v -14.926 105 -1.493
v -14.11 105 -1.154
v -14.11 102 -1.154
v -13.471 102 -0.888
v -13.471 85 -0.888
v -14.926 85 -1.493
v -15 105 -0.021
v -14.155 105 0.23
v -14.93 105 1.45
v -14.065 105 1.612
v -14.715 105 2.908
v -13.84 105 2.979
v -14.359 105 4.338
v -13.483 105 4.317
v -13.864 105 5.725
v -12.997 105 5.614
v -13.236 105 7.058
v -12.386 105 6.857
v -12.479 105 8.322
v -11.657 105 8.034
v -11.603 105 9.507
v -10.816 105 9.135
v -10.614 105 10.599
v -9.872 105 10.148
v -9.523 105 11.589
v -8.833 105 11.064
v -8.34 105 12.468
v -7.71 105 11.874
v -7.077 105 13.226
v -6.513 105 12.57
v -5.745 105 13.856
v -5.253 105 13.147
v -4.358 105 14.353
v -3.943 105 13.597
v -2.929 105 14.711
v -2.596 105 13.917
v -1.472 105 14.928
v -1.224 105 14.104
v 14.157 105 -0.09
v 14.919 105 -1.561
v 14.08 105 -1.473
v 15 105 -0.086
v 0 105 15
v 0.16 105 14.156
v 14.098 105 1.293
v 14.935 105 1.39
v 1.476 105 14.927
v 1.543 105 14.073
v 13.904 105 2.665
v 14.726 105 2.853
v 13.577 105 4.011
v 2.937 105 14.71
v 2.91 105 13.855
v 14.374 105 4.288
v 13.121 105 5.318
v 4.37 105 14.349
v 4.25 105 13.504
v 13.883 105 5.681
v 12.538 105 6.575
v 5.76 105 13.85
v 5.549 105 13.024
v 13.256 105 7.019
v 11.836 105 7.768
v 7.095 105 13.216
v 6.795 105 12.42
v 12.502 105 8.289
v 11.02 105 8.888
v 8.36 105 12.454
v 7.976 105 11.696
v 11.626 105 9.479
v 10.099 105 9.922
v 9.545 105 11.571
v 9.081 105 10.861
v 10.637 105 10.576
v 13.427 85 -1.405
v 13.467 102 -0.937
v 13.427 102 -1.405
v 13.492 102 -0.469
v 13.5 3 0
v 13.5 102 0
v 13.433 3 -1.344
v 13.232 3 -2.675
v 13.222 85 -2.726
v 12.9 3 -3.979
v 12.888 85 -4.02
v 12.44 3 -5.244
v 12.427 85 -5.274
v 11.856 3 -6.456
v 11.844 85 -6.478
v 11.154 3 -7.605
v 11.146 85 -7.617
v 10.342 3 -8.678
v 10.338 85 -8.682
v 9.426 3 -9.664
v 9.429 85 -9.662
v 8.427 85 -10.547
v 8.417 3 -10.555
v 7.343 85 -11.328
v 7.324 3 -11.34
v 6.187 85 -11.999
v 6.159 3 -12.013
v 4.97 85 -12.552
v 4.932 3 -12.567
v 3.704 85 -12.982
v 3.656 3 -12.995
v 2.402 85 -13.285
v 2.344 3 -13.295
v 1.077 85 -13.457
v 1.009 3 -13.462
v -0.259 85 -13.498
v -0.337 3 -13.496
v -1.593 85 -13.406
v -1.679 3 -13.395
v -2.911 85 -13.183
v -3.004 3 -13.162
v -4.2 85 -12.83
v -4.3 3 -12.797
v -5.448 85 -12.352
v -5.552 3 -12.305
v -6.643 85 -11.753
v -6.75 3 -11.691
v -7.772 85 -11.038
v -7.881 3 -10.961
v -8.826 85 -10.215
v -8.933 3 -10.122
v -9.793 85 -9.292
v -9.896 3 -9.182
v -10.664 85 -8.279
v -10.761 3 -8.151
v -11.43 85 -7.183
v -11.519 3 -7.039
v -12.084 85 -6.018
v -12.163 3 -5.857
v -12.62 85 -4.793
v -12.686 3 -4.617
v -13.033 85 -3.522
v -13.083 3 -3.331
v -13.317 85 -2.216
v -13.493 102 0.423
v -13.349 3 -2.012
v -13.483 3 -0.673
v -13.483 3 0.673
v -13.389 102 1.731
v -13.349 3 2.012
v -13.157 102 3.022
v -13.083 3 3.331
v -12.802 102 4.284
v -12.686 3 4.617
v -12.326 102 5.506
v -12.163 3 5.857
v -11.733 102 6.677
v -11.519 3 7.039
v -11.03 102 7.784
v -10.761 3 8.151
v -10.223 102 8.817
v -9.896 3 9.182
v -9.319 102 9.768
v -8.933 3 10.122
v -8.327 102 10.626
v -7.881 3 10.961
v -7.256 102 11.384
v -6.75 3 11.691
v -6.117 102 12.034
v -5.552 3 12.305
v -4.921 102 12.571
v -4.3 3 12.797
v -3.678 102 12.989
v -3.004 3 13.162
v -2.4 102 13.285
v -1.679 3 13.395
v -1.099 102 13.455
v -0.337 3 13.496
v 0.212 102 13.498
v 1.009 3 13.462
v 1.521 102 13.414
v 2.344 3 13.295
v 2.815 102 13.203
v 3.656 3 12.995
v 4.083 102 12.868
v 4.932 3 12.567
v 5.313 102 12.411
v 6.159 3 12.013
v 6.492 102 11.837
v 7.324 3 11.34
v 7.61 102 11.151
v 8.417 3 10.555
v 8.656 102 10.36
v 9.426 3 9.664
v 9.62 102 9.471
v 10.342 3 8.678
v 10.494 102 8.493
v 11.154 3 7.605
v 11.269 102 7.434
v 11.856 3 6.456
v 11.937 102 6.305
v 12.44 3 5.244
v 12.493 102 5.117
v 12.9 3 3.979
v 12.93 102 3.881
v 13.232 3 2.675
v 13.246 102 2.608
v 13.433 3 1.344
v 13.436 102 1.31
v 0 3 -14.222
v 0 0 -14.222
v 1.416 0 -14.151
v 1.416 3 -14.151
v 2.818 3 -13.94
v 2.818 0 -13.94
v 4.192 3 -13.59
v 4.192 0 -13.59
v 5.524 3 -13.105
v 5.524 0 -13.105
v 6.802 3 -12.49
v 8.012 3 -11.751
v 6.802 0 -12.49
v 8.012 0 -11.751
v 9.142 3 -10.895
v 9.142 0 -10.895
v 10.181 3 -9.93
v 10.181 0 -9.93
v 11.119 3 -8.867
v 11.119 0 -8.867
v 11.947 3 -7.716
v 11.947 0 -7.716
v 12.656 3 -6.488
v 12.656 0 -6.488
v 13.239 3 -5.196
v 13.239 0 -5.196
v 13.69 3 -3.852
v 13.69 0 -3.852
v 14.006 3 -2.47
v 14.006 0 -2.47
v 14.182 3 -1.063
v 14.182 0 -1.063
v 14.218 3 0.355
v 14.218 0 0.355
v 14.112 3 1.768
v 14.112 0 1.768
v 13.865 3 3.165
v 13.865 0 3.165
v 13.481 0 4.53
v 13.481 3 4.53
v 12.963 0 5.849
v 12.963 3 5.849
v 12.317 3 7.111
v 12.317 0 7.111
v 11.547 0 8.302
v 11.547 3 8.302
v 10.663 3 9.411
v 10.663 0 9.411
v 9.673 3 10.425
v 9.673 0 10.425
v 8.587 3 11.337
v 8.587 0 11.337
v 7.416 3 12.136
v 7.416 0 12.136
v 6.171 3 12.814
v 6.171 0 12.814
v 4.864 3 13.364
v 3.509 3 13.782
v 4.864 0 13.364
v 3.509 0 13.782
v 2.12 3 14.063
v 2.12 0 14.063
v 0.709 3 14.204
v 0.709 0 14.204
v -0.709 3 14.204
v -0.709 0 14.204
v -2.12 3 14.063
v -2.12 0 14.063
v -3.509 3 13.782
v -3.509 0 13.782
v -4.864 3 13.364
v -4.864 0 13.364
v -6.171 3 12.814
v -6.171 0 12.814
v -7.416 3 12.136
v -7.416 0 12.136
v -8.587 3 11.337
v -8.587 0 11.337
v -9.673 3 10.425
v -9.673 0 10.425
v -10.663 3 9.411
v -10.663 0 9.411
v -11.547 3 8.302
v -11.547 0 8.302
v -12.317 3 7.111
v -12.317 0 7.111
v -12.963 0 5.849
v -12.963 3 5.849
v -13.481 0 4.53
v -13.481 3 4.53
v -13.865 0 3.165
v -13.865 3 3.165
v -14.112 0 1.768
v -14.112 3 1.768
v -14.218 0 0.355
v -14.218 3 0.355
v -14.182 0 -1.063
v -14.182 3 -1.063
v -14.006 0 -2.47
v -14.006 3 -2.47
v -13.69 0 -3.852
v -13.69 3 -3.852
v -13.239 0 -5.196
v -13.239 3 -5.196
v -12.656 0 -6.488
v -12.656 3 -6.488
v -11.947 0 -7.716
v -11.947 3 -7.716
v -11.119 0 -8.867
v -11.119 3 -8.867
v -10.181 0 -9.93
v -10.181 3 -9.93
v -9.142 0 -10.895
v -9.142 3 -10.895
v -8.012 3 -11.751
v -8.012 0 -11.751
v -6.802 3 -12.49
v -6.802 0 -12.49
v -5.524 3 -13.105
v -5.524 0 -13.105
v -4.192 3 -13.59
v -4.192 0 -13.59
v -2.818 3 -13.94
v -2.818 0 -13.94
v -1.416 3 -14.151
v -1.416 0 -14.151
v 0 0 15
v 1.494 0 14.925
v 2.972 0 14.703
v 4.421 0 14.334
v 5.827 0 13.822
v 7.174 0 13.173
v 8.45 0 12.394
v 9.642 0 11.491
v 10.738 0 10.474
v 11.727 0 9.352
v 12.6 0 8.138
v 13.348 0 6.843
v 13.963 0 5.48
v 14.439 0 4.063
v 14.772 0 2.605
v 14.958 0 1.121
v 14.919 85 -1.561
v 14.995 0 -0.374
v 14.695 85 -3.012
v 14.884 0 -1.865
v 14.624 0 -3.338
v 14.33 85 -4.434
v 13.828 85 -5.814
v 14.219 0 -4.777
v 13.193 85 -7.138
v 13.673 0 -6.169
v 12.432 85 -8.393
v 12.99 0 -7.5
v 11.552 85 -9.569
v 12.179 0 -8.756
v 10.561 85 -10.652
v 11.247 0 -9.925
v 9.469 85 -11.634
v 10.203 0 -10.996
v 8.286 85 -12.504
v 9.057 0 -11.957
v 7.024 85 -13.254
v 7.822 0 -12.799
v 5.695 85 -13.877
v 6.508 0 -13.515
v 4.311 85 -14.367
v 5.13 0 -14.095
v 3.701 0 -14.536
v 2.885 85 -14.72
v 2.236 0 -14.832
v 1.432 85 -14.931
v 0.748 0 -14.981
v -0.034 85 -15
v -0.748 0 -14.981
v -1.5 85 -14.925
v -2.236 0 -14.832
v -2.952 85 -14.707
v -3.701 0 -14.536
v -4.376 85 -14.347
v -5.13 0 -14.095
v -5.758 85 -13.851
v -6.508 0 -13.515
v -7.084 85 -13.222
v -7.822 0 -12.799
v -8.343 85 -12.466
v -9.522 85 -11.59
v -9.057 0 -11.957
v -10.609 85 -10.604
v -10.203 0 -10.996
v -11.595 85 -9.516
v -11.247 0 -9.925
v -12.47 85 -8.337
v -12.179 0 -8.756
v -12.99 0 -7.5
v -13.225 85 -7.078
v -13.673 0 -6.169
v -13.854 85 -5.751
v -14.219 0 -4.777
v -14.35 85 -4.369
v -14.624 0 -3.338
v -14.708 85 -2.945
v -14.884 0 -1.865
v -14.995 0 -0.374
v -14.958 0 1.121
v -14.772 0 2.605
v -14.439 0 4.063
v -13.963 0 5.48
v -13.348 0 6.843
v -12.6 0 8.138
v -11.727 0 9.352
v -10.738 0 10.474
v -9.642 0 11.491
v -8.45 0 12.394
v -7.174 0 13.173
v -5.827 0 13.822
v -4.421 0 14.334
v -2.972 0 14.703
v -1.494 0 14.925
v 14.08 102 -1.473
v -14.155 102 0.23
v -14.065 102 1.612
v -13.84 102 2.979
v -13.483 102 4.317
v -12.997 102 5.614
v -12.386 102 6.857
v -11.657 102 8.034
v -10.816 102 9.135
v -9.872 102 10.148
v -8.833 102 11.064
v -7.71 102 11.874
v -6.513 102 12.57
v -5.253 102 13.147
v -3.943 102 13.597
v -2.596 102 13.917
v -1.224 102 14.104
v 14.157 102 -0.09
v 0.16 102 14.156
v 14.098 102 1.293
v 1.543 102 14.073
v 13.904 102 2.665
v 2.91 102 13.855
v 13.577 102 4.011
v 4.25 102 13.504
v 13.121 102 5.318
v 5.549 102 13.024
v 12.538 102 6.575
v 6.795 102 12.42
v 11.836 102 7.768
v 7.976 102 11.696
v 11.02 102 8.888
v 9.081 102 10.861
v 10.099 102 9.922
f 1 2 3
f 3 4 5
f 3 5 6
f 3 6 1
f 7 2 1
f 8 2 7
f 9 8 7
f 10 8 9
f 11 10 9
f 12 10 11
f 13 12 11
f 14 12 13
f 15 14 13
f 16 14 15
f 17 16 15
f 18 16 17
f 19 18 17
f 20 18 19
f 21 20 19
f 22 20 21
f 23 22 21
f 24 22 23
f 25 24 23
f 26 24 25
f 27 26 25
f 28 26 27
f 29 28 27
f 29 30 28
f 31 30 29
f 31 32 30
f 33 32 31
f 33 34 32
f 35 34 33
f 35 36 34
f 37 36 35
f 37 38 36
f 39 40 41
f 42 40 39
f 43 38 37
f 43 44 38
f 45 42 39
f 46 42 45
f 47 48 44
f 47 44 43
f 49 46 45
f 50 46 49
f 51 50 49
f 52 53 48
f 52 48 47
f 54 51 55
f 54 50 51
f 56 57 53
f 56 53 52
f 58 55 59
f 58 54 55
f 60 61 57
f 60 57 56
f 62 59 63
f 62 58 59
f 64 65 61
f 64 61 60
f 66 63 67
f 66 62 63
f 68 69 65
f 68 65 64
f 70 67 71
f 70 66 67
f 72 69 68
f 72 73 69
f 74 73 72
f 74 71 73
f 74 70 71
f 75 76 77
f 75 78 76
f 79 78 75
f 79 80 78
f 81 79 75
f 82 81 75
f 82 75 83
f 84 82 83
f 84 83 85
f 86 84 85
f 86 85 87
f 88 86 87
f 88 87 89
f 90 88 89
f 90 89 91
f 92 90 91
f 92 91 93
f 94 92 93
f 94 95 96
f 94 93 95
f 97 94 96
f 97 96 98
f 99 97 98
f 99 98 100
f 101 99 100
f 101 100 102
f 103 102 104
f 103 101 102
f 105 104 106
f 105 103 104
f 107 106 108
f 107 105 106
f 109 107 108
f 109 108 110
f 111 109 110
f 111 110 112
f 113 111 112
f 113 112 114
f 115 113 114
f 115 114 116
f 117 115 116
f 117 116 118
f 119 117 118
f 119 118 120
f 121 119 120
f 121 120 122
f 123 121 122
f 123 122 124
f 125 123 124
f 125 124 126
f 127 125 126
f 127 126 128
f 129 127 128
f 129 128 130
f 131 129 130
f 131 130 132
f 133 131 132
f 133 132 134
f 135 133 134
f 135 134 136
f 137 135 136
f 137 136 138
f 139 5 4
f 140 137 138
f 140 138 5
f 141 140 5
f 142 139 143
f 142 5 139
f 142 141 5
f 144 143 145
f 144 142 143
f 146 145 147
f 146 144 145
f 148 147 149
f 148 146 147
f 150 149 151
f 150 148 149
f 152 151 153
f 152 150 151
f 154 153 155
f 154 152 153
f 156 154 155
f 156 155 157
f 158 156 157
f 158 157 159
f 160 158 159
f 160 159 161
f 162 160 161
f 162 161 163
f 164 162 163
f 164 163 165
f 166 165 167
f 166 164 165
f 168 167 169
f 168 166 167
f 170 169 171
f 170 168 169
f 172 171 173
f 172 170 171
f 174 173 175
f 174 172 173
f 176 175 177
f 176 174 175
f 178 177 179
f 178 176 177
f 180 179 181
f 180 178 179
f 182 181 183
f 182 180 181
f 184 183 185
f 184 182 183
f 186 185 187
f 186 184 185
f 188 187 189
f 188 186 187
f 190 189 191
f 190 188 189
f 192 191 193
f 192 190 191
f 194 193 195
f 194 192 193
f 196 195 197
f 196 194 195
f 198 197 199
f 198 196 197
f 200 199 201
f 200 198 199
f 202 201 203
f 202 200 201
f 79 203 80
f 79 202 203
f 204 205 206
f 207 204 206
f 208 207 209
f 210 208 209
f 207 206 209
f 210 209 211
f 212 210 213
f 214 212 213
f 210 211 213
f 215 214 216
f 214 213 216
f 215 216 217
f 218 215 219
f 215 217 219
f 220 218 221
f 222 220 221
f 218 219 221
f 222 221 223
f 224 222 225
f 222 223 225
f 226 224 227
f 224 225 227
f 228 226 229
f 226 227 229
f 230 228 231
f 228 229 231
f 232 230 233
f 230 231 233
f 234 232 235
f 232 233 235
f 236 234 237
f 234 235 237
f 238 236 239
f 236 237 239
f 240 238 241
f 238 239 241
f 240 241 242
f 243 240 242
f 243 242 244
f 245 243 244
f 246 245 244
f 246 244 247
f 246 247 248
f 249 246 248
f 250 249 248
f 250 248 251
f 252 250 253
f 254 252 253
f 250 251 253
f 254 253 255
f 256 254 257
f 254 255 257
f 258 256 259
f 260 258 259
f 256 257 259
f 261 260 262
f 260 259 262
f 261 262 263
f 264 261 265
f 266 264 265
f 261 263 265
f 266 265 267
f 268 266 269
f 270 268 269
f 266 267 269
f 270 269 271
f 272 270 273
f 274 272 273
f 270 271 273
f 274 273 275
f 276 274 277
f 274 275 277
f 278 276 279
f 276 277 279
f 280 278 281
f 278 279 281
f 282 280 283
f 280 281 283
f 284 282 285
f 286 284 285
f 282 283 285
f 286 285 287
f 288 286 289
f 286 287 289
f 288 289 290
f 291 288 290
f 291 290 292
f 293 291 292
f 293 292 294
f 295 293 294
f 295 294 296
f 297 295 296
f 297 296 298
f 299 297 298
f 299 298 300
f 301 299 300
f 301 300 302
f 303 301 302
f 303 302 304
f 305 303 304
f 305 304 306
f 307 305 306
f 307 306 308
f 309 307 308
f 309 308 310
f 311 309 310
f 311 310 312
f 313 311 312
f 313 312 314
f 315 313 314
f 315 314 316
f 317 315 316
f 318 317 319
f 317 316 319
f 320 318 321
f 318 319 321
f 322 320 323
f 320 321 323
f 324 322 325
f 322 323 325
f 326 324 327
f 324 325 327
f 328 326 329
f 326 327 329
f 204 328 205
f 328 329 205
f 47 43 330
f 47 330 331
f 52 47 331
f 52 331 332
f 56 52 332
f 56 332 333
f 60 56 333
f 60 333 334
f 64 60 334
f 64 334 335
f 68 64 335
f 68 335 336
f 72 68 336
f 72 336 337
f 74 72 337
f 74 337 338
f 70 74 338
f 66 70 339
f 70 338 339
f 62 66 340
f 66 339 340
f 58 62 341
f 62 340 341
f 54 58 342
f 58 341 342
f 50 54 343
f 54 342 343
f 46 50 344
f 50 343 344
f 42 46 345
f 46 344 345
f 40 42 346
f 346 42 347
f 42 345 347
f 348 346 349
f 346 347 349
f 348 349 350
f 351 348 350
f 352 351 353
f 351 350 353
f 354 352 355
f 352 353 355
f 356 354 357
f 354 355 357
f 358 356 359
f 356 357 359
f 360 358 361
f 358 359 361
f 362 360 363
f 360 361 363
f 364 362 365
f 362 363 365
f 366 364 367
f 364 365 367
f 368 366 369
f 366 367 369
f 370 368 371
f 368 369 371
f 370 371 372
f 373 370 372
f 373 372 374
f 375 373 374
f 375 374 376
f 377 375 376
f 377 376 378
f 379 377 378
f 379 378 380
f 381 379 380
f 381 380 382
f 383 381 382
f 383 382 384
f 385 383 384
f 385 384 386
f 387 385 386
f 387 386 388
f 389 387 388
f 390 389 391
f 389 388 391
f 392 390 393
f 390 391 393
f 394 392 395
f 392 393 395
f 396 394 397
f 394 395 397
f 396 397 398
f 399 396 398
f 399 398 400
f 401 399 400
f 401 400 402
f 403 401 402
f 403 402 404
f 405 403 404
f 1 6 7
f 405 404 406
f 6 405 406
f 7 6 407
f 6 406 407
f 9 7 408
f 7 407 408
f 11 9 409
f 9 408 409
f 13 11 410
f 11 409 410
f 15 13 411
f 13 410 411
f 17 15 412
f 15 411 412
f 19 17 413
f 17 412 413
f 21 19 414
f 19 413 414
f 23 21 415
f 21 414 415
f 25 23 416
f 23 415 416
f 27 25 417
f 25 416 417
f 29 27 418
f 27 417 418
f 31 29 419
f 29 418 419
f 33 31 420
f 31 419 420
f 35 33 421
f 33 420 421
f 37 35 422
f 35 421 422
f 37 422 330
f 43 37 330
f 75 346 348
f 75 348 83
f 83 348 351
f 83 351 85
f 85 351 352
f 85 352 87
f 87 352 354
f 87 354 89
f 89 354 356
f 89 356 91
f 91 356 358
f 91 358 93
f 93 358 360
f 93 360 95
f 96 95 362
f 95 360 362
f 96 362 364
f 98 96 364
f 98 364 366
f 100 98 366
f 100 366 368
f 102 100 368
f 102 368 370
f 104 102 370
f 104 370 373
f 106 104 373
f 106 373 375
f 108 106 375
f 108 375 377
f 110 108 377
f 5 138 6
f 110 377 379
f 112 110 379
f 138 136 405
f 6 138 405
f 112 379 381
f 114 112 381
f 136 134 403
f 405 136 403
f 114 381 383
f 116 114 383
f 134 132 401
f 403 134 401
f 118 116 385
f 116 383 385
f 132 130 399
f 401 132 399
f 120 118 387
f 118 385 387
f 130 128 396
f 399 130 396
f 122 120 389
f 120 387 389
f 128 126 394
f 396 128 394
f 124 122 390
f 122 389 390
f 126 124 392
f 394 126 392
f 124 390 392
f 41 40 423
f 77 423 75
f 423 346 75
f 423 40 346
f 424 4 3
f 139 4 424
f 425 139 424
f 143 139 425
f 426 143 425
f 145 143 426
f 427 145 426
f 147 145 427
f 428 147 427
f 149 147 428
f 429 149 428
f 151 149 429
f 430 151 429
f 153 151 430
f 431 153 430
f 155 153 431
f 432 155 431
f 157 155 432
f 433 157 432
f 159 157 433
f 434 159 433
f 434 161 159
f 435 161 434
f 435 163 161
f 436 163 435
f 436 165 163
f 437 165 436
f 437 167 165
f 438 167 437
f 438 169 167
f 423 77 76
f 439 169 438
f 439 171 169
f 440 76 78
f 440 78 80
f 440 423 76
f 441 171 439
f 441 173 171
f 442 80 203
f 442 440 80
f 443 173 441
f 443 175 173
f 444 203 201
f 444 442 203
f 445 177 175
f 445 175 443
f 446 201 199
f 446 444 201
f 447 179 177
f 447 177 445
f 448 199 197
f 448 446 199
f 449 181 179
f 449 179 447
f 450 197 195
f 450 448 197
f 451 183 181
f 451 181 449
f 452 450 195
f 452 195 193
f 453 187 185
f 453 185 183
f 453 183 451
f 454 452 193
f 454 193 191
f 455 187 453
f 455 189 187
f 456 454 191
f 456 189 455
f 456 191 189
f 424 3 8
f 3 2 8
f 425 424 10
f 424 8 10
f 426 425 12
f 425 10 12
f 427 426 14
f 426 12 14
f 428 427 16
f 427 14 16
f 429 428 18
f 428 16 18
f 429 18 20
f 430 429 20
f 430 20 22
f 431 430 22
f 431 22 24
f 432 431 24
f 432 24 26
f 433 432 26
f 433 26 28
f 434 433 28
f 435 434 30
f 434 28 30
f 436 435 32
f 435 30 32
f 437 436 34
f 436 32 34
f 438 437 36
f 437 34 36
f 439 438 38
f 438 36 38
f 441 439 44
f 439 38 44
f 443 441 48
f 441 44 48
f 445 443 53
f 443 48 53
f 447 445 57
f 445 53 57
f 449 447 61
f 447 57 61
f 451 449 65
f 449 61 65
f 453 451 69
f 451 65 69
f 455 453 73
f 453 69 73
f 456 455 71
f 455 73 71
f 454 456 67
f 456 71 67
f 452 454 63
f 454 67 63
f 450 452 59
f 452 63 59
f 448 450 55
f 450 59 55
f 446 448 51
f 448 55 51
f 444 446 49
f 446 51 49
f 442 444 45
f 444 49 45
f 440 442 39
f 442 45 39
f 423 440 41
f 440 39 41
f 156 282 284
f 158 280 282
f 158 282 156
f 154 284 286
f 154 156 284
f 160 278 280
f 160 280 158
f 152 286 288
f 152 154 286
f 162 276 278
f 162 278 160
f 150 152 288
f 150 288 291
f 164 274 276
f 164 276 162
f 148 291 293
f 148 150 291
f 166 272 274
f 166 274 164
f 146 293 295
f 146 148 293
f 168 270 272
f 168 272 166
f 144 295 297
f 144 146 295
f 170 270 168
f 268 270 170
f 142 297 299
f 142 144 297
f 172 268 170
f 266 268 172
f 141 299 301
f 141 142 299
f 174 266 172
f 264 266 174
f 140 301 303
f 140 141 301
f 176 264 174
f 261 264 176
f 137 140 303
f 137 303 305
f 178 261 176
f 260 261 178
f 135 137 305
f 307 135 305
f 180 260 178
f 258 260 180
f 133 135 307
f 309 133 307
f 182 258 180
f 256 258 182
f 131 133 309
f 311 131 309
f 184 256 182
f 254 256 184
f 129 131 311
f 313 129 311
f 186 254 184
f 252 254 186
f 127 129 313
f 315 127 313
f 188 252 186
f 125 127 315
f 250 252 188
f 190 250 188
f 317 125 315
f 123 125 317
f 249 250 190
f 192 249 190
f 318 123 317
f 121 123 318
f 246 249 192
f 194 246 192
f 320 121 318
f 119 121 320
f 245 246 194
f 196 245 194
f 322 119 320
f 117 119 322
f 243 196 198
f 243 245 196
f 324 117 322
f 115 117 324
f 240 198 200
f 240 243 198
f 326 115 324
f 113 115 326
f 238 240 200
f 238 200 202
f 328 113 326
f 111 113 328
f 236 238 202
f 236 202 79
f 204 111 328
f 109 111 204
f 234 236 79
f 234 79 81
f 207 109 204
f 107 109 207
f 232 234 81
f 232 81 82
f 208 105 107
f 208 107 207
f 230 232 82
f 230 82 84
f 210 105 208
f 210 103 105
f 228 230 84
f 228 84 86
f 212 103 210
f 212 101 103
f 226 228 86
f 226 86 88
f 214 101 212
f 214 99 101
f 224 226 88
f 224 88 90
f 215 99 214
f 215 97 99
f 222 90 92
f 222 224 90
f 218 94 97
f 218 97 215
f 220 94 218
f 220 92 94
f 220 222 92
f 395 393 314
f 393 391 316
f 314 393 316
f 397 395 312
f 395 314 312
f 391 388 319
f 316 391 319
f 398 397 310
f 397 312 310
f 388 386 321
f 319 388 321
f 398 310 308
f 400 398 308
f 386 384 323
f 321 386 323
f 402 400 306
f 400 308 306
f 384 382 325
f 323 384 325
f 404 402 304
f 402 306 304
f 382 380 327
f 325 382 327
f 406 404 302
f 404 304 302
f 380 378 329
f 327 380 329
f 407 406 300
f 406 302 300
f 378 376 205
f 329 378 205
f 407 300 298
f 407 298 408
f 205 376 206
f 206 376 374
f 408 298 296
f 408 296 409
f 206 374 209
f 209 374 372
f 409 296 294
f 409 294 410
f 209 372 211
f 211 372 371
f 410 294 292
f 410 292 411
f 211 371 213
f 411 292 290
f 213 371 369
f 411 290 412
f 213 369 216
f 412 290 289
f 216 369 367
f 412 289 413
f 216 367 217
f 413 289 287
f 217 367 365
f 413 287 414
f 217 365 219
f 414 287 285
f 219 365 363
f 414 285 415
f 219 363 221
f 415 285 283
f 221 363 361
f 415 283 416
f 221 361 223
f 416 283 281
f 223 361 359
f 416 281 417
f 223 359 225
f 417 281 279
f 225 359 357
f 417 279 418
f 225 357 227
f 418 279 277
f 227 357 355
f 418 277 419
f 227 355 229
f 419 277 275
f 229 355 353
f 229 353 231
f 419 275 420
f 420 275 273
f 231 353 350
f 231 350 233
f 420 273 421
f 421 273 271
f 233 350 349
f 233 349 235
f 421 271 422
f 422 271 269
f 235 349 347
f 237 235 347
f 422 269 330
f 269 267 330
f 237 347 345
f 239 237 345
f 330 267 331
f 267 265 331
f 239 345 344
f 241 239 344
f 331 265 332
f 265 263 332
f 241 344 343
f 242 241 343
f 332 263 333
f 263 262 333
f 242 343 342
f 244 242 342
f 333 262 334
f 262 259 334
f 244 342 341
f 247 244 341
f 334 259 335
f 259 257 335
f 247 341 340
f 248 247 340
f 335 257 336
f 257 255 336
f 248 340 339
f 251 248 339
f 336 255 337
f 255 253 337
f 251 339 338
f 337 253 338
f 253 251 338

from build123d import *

# Parameters (mm, degrees)
SKETCH1_R           = 15
BOSS_EXTRUDE1_DEPTH = 105
SKETCH6_R           = 14.222015383
CUT_EXTRUDE4_DEPTH  = 3
SHELL1_START        = 3
SHELL1_OUTLINE_R    = 13.5
SHELL1_DEPTH        = 102
SKETCH8_R           = 14.157324042
CUT_EXTRUDE6_DEPTH  = 3
CUT_EXTRUDE7_START  = -20
CUT_EXTRUDE7_DEPTH  = 20


# Read off the part's stored shape, not the designer's step: Shell1
with BuildPart() as part:
    # Sketch1 → Boss-Extrude1 (new body)
    with BuildSketch(Plane(origin=(0, 0, 0), x_dir=(1, 0, 0), z_dir=(0, 1, 0))):
        with Locations(Location((0, 0, 0), (0, 0, 270))):
            Circle(SKETCH1_R)
    extrude(amount=BOSS_EXTRUDE1_DEPTH)

    # Sketch6 → Cut-Extrude4 (cut)
    with BuildSketch(Plane.XZ):
        with Locations(Location((0, 0, 0), (0, 0, 270))):
            Circle(SKETCH6_R)
    extrude(amount=-CUT_EXTRUDE4_DEPTH, mode=Mode.SUBTRACT)

    # Shell1 outline → Shell1 (cut)
    with BuildSketch(Plane(origin=(0, 0, 0), x_dir=(1, 0, 0), z_dir=(0, 1, 0)).offset(SHELL1_START)):
        Circle(SHELL1_OUTLINE_R)
    extrude(amount=SHELL1_DEPTH, mode=Mode.SUBTRACT)

    # Sketch8 → Cut-Extrude6 (cut)
    with BuildSketch(Plane(origin=(0, 105, 0), x_dir=(1, 0, 0), z_dir=(0, 1, 0))):
        with Locations(Location((0, 0, 0), (0, 0, 270))):
            Circle(SKETCH8_R)
    extrude(amount=-CUT_EXTRUDE6_DEPTH, mode=Mode.SUBTRACT)

    # Sketch9 → Cut-Extrude7 (cut)
    with BuildSketch(Plane(origin=(0, 105, 0), x_dir=(1, 0, 0), z_dir=(0, 1, 0)).offset(CUT_EXTRUDE7_START)):
        with BuildLine():
            Line((14.918575787, 1.560799953), (13.426718208, 1.404719958))
            Line((13.426718208, 1.404719958), (-13.47075587, 0.888108258))
            Line((-13.47075587, 0.888108258), (-14.925527409, 1.492860192))
            ThreePointArc((-14.925527409, 1.492860192), (-0.03414724, 14.999961132), (14.918575787, 1.560799953))
        make_face()
    extrude(amount=CUT_EXTRUDE7_DEPTH, mode=Mode.SUBTRACT)


solid = part.part
